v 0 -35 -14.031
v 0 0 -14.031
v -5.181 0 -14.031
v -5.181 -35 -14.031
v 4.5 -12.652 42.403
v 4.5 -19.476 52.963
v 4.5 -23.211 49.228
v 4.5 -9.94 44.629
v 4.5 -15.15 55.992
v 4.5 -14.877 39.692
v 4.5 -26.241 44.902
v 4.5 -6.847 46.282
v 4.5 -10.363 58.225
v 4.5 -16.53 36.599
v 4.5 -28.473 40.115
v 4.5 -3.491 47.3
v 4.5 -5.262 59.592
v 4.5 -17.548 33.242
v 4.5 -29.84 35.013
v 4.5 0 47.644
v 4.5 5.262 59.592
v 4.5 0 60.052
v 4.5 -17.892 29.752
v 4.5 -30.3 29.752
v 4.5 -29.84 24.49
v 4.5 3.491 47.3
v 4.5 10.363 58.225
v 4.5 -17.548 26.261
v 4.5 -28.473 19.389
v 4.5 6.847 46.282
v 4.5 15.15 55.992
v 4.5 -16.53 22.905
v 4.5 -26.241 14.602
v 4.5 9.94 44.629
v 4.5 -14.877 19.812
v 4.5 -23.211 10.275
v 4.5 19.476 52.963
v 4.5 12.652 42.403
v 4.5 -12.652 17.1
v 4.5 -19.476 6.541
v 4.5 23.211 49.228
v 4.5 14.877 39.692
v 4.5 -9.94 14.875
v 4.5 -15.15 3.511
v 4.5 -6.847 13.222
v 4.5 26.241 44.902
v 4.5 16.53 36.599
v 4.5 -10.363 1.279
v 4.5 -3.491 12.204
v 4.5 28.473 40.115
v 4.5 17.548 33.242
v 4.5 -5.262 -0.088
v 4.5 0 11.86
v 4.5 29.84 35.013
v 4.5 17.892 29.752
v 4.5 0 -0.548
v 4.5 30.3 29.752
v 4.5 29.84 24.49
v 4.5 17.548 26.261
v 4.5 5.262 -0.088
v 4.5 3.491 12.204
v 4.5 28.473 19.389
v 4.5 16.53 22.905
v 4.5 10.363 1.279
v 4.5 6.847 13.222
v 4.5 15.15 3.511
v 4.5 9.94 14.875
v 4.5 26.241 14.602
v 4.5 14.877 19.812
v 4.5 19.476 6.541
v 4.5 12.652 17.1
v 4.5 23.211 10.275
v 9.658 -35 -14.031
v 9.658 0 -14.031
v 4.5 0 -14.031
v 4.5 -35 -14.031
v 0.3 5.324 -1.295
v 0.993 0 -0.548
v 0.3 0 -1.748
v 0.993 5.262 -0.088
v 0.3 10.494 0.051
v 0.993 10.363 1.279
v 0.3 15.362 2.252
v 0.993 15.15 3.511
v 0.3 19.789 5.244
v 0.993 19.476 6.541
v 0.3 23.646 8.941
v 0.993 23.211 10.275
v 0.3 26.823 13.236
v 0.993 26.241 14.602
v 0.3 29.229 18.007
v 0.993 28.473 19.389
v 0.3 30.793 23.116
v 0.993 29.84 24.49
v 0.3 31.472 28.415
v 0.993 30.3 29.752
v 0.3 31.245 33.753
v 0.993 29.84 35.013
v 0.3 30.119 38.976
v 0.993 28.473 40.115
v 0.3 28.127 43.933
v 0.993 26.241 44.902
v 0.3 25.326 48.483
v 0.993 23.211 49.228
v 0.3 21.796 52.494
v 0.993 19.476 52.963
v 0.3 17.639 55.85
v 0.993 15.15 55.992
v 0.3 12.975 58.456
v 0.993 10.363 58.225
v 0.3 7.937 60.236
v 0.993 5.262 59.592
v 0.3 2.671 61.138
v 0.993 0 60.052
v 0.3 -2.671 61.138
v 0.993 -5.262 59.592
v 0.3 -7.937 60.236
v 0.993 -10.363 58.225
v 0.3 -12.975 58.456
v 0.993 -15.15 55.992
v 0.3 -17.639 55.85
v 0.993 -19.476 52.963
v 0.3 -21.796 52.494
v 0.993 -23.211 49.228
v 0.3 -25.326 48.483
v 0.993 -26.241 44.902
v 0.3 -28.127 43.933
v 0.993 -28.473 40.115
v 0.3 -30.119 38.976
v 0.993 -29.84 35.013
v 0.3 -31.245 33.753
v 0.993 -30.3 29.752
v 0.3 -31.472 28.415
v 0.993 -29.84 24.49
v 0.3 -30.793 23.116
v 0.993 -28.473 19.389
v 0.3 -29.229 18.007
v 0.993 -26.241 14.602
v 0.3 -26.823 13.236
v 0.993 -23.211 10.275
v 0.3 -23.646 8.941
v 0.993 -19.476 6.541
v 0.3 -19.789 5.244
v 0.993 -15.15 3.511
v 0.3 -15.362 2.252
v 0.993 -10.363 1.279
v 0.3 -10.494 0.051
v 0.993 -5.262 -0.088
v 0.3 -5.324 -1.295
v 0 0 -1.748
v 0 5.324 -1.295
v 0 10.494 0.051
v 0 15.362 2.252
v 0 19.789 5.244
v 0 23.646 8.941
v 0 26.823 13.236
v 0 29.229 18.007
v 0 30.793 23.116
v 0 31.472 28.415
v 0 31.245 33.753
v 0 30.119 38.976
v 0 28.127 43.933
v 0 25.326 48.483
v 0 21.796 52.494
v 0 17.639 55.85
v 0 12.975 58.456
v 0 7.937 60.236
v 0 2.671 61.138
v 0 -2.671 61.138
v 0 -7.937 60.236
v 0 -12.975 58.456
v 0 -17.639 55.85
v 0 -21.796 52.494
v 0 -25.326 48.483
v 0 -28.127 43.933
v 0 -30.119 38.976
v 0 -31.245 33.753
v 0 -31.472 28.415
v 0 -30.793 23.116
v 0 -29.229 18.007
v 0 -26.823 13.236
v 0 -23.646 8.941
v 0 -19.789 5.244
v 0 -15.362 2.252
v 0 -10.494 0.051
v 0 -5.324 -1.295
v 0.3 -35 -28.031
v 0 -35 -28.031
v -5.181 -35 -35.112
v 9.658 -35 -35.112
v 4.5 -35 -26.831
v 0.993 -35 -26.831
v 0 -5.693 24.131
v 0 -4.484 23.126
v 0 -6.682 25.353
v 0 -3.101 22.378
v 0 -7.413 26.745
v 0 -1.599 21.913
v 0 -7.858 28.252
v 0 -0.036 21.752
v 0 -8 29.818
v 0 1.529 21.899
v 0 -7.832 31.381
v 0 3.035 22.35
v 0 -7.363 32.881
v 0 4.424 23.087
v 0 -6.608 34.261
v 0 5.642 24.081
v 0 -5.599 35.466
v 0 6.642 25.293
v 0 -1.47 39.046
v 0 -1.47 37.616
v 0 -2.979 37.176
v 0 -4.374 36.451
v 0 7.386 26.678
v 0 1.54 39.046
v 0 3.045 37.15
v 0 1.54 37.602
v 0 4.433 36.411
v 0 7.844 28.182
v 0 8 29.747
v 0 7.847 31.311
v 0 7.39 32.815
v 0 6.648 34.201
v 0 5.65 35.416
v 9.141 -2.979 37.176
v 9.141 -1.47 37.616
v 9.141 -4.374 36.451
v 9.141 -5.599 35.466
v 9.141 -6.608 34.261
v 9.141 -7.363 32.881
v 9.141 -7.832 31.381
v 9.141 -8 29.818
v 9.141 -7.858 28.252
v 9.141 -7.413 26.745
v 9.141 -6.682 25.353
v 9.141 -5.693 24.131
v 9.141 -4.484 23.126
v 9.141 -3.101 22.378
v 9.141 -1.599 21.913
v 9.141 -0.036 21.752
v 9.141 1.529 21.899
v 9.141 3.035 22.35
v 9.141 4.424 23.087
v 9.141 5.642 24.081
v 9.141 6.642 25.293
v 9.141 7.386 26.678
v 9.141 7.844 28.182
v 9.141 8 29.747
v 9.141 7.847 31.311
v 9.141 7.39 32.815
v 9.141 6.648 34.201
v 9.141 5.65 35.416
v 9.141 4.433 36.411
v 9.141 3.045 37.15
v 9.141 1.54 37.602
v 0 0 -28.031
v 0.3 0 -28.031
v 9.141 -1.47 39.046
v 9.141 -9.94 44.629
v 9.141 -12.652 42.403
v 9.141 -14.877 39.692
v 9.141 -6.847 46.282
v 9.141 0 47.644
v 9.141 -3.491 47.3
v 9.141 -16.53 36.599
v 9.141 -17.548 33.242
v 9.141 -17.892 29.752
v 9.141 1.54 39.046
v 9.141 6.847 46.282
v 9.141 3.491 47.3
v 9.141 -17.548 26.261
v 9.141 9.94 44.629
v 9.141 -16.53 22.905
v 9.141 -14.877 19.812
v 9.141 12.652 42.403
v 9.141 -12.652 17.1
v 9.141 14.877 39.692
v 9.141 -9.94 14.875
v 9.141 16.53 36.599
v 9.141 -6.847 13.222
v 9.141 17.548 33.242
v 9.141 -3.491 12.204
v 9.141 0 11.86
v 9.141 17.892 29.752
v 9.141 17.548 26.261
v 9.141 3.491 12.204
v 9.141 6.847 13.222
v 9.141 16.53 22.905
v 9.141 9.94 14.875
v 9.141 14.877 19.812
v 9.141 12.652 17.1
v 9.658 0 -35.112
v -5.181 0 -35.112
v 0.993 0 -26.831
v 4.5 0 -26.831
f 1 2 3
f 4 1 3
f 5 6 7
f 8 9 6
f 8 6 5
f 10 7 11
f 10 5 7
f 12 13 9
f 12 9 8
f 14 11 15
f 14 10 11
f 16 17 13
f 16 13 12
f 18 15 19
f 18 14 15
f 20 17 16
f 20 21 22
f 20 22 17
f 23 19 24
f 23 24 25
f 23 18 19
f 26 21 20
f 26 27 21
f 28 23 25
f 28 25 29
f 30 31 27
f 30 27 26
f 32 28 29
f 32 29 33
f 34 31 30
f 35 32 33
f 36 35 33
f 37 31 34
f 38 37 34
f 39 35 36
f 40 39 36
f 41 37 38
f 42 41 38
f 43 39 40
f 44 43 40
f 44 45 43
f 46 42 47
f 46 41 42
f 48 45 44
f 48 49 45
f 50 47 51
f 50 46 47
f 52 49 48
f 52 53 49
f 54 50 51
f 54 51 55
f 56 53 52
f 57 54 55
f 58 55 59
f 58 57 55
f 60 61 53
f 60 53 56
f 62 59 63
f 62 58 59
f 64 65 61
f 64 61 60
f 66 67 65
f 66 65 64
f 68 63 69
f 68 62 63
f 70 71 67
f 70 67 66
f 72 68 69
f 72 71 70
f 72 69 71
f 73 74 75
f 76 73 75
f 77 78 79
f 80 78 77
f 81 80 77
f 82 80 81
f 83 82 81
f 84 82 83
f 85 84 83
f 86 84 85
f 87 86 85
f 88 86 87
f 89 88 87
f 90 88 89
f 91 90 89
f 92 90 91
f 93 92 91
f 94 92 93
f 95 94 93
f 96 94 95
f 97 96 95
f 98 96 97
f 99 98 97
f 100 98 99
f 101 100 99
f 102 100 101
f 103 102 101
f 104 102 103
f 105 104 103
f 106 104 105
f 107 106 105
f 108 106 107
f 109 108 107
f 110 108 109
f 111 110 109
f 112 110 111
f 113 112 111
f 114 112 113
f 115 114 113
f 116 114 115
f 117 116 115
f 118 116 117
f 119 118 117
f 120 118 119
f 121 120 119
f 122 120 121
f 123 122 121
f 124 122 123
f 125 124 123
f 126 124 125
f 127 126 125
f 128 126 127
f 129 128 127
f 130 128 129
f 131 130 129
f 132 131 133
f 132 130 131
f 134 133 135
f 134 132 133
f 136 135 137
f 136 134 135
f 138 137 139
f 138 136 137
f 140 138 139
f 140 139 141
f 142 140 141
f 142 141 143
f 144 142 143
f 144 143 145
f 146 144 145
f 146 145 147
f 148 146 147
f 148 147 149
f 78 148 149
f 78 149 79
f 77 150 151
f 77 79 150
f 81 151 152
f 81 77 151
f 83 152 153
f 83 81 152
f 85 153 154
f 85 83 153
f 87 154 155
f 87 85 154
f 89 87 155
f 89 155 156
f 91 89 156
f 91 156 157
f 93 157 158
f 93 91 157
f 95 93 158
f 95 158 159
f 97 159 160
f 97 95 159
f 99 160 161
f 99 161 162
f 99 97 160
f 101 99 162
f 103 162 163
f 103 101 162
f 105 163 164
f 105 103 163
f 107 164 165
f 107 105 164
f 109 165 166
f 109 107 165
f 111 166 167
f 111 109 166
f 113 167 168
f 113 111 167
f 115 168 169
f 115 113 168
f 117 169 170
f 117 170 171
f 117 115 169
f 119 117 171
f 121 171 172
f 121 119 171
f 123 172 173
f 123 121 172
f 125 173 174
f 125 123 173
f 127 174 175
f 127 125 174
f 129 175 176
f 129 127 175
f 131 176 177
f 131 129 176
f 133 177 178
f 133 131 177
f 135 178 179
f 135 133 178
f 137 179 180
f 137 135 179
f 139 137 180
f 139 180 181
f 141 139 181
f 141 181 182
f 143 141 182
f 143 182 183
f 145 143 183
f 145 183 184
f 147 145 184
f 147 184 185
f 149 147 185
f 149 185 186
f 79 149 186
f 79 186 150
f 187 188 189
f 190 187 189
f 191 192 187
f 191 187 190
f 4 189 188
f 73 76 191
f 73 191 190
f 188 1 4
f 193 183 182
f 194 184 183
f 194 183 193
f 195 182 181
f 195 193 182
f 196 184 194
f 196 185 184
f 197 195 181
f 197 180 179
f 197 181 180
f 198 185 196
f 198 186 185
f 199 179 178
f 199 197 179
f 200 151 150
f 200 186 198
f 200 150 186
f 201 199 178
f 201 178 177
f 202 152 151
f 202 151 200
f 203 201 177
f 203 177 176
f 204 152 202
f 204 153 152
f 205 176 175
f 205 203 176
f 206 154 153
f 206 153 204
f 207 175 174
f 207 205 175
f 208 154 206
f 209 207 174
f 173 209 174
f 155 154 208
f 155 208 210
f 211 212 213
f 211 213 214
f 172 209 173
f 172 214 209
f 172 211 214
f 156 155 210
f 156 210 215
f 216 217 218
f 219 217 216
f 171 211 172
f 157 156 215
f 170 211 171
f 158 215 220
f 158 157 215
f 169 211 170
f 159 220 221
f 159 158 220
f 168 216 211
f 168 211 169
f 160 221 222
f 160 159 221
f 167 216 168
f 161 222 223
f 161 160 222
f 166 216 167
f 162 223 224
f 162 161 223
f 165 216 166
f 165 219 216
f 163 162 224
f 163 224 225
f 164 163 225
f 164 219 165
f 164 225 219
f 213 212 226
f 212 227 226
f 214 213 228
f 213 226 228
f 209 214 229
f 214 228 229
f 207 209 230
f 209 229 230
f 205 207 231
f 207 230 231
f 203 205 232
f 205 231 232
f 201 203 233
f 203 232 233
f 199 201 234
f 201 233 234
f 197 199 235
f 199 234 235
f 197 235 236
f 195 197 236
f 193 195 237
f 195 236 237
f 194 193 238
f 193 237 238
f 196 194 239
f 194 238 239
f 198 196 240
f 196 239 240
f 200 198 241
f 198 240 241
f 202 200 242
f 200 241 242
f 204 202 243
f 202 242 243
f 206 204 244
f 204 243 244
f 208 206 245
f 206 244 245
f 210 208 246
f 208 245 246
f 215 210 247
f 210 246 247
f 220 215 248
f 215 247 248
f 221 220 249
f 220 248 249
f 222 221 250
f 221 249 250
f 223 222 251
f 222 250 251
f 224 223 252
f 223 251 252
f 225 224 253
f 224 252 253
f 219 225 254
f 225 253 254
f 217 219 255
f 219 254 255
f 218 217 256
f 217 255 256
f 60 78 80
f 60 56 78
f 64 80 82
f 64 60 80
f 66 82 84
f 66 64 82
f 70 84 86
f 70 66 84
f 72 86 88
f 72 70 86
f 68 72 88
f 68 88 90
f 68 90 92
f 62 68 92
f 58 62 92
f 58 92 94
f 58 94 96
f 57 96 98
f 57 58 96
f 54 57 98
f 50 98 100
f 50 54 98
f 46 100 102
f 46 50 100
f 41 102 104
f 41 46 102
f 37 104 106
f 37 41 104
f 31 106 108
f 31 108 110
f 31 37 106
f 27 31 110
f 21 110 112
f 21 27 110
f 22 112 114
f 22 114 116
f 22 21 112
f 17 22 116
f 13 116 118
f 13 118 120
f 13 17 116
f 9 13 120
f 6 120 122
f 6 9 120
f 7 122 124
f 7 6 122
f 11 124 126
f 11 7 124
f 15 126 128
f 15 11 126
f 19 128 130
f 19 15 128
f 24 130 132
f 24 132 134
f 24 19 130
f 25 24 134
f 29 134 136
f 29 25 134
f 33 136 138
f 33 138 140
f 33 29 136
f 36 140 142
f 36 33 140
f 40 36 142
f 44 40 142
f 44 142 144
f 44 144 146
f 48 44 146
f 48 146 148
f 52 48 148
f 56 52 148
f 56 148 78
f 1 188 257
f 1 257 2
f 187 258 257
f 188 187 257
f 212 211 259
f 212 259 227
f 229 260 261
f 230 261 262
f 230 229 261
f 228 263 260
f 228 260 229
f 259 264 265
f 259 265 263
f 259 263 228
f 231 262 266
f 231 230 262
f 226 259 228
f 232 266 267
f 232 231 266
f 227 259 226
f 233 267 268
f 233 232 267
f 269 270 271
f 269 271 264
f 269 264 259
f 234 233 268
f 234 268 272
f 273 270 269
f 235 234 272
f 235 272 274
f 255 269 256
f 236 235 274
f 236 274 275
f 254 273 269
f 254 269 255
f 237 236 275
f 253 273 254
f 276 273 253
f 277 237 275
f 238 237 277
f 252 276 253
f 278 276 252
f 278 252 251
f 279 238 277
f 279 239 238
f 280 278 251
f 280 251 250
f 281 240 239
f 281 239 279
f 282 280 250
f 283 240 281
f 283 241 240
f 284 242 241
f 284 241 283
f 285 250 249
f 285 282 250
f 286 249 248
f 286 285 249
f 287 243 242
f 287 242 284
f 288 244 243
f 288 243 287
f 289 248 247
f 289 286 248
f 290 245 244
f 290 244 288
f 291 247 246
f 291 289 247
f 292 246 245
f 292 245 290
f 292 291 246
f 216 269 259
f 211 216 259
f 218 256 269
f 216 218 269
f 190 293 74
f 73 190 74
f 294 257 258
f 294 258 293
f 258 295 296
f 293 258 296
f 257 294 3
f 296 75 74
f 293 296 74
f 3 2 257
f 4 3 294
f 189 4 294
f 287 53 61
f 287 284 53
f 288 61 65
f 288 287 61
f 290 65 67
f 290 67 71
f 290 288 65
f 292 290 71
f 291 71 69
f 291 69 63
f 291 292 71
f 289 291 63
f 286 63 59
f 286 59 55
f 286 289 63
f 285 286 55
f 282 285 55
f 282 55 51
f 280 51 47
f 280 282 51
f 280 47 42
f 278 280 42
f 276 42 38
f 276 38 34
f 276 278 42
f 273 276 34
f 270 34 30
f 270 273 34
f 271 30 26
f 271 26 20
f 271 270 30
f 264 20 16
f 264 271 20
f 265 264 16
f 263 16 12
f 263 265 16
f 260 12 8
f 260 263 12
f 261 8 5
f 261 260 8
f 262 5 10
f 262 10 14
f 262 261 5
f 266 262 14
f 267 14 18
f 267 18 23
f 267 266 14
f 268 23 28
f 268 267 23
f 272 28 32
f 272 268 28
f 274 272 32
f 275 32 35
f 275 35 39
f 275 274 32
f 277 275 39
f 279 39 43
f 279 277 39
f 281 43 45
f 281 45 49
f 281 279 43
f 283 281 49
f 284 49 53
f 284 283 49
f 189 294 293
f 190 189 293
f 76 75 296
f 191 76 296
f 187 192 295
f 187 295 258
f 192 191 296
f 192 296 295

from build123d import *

# Parameters (mm, degrees)
F3_DEPTH = 35
F4_R     = 8
F5_DEPTH = 25
F7_DEPTH = 25


with BuildPart() as f1:
    # F0 (on Front) → F1 (revolve)
    with BuildSketch(Plane.XZ):
        Polygon((0, 29.751923), (0, -1.748077), (0.3, -1.748077), (0.99282, -0.548077), (4.5, -0.548077), (4.5, 11.859911), (9.140844, 11.859911), (9.140844, 29.751923), align=None)
    revolve(axis=Axis((4.570422, 0, 29.751923), (1, 0, 0)))

    # F4 (on face) → F5 (cut)
    with BuildSketch(Plane.YZ.offset(9.140844)):
        with Locations((0, 29.751923)):
            Circle(F4_R)
    extrude(amount=-F5_DEPTH, mode=Mode.SUBTRACT)

    # F6 (on face) → F7 (cut)
    with BuildSketch(Plane.YZ.offset(9.140844)):
        with BuildLine():
            Line((1.53999, 39.046196), (-1.469835, 39.046196))
            Line((-1.469835, 39.046196), (-1.469835, 37.615738))
            ThreePointArc((-1.469835, 37.615738), (0.035715, 37.751844), (1.53999, 37.602301))
            Line((1.53999, 37.602301), (1.53999, 39.046196))
        make_face()
    extrude(amount=-F7_DEPTH, mode=Mode.SUBTRACT)


with BuildPart() as f3:
    # F2 (on Front) → F3 (new body)
    with BuildSketch(Plane.XZ):
        Polygon((4.5, -26.831364), (0.99282, -26.831364), (0.3, -28.031364), (0, -28.031364), (0, -14.031364), (-5.181407, -14.031364), (-5.181407, -35.111859), (9.657942, -35.111859), (9.657942, -14.031364), (4.5, -14.031364), align=None)
    extrude(amount=F3_DEPTH)


solid = Compound([f1.part, f3.part])
